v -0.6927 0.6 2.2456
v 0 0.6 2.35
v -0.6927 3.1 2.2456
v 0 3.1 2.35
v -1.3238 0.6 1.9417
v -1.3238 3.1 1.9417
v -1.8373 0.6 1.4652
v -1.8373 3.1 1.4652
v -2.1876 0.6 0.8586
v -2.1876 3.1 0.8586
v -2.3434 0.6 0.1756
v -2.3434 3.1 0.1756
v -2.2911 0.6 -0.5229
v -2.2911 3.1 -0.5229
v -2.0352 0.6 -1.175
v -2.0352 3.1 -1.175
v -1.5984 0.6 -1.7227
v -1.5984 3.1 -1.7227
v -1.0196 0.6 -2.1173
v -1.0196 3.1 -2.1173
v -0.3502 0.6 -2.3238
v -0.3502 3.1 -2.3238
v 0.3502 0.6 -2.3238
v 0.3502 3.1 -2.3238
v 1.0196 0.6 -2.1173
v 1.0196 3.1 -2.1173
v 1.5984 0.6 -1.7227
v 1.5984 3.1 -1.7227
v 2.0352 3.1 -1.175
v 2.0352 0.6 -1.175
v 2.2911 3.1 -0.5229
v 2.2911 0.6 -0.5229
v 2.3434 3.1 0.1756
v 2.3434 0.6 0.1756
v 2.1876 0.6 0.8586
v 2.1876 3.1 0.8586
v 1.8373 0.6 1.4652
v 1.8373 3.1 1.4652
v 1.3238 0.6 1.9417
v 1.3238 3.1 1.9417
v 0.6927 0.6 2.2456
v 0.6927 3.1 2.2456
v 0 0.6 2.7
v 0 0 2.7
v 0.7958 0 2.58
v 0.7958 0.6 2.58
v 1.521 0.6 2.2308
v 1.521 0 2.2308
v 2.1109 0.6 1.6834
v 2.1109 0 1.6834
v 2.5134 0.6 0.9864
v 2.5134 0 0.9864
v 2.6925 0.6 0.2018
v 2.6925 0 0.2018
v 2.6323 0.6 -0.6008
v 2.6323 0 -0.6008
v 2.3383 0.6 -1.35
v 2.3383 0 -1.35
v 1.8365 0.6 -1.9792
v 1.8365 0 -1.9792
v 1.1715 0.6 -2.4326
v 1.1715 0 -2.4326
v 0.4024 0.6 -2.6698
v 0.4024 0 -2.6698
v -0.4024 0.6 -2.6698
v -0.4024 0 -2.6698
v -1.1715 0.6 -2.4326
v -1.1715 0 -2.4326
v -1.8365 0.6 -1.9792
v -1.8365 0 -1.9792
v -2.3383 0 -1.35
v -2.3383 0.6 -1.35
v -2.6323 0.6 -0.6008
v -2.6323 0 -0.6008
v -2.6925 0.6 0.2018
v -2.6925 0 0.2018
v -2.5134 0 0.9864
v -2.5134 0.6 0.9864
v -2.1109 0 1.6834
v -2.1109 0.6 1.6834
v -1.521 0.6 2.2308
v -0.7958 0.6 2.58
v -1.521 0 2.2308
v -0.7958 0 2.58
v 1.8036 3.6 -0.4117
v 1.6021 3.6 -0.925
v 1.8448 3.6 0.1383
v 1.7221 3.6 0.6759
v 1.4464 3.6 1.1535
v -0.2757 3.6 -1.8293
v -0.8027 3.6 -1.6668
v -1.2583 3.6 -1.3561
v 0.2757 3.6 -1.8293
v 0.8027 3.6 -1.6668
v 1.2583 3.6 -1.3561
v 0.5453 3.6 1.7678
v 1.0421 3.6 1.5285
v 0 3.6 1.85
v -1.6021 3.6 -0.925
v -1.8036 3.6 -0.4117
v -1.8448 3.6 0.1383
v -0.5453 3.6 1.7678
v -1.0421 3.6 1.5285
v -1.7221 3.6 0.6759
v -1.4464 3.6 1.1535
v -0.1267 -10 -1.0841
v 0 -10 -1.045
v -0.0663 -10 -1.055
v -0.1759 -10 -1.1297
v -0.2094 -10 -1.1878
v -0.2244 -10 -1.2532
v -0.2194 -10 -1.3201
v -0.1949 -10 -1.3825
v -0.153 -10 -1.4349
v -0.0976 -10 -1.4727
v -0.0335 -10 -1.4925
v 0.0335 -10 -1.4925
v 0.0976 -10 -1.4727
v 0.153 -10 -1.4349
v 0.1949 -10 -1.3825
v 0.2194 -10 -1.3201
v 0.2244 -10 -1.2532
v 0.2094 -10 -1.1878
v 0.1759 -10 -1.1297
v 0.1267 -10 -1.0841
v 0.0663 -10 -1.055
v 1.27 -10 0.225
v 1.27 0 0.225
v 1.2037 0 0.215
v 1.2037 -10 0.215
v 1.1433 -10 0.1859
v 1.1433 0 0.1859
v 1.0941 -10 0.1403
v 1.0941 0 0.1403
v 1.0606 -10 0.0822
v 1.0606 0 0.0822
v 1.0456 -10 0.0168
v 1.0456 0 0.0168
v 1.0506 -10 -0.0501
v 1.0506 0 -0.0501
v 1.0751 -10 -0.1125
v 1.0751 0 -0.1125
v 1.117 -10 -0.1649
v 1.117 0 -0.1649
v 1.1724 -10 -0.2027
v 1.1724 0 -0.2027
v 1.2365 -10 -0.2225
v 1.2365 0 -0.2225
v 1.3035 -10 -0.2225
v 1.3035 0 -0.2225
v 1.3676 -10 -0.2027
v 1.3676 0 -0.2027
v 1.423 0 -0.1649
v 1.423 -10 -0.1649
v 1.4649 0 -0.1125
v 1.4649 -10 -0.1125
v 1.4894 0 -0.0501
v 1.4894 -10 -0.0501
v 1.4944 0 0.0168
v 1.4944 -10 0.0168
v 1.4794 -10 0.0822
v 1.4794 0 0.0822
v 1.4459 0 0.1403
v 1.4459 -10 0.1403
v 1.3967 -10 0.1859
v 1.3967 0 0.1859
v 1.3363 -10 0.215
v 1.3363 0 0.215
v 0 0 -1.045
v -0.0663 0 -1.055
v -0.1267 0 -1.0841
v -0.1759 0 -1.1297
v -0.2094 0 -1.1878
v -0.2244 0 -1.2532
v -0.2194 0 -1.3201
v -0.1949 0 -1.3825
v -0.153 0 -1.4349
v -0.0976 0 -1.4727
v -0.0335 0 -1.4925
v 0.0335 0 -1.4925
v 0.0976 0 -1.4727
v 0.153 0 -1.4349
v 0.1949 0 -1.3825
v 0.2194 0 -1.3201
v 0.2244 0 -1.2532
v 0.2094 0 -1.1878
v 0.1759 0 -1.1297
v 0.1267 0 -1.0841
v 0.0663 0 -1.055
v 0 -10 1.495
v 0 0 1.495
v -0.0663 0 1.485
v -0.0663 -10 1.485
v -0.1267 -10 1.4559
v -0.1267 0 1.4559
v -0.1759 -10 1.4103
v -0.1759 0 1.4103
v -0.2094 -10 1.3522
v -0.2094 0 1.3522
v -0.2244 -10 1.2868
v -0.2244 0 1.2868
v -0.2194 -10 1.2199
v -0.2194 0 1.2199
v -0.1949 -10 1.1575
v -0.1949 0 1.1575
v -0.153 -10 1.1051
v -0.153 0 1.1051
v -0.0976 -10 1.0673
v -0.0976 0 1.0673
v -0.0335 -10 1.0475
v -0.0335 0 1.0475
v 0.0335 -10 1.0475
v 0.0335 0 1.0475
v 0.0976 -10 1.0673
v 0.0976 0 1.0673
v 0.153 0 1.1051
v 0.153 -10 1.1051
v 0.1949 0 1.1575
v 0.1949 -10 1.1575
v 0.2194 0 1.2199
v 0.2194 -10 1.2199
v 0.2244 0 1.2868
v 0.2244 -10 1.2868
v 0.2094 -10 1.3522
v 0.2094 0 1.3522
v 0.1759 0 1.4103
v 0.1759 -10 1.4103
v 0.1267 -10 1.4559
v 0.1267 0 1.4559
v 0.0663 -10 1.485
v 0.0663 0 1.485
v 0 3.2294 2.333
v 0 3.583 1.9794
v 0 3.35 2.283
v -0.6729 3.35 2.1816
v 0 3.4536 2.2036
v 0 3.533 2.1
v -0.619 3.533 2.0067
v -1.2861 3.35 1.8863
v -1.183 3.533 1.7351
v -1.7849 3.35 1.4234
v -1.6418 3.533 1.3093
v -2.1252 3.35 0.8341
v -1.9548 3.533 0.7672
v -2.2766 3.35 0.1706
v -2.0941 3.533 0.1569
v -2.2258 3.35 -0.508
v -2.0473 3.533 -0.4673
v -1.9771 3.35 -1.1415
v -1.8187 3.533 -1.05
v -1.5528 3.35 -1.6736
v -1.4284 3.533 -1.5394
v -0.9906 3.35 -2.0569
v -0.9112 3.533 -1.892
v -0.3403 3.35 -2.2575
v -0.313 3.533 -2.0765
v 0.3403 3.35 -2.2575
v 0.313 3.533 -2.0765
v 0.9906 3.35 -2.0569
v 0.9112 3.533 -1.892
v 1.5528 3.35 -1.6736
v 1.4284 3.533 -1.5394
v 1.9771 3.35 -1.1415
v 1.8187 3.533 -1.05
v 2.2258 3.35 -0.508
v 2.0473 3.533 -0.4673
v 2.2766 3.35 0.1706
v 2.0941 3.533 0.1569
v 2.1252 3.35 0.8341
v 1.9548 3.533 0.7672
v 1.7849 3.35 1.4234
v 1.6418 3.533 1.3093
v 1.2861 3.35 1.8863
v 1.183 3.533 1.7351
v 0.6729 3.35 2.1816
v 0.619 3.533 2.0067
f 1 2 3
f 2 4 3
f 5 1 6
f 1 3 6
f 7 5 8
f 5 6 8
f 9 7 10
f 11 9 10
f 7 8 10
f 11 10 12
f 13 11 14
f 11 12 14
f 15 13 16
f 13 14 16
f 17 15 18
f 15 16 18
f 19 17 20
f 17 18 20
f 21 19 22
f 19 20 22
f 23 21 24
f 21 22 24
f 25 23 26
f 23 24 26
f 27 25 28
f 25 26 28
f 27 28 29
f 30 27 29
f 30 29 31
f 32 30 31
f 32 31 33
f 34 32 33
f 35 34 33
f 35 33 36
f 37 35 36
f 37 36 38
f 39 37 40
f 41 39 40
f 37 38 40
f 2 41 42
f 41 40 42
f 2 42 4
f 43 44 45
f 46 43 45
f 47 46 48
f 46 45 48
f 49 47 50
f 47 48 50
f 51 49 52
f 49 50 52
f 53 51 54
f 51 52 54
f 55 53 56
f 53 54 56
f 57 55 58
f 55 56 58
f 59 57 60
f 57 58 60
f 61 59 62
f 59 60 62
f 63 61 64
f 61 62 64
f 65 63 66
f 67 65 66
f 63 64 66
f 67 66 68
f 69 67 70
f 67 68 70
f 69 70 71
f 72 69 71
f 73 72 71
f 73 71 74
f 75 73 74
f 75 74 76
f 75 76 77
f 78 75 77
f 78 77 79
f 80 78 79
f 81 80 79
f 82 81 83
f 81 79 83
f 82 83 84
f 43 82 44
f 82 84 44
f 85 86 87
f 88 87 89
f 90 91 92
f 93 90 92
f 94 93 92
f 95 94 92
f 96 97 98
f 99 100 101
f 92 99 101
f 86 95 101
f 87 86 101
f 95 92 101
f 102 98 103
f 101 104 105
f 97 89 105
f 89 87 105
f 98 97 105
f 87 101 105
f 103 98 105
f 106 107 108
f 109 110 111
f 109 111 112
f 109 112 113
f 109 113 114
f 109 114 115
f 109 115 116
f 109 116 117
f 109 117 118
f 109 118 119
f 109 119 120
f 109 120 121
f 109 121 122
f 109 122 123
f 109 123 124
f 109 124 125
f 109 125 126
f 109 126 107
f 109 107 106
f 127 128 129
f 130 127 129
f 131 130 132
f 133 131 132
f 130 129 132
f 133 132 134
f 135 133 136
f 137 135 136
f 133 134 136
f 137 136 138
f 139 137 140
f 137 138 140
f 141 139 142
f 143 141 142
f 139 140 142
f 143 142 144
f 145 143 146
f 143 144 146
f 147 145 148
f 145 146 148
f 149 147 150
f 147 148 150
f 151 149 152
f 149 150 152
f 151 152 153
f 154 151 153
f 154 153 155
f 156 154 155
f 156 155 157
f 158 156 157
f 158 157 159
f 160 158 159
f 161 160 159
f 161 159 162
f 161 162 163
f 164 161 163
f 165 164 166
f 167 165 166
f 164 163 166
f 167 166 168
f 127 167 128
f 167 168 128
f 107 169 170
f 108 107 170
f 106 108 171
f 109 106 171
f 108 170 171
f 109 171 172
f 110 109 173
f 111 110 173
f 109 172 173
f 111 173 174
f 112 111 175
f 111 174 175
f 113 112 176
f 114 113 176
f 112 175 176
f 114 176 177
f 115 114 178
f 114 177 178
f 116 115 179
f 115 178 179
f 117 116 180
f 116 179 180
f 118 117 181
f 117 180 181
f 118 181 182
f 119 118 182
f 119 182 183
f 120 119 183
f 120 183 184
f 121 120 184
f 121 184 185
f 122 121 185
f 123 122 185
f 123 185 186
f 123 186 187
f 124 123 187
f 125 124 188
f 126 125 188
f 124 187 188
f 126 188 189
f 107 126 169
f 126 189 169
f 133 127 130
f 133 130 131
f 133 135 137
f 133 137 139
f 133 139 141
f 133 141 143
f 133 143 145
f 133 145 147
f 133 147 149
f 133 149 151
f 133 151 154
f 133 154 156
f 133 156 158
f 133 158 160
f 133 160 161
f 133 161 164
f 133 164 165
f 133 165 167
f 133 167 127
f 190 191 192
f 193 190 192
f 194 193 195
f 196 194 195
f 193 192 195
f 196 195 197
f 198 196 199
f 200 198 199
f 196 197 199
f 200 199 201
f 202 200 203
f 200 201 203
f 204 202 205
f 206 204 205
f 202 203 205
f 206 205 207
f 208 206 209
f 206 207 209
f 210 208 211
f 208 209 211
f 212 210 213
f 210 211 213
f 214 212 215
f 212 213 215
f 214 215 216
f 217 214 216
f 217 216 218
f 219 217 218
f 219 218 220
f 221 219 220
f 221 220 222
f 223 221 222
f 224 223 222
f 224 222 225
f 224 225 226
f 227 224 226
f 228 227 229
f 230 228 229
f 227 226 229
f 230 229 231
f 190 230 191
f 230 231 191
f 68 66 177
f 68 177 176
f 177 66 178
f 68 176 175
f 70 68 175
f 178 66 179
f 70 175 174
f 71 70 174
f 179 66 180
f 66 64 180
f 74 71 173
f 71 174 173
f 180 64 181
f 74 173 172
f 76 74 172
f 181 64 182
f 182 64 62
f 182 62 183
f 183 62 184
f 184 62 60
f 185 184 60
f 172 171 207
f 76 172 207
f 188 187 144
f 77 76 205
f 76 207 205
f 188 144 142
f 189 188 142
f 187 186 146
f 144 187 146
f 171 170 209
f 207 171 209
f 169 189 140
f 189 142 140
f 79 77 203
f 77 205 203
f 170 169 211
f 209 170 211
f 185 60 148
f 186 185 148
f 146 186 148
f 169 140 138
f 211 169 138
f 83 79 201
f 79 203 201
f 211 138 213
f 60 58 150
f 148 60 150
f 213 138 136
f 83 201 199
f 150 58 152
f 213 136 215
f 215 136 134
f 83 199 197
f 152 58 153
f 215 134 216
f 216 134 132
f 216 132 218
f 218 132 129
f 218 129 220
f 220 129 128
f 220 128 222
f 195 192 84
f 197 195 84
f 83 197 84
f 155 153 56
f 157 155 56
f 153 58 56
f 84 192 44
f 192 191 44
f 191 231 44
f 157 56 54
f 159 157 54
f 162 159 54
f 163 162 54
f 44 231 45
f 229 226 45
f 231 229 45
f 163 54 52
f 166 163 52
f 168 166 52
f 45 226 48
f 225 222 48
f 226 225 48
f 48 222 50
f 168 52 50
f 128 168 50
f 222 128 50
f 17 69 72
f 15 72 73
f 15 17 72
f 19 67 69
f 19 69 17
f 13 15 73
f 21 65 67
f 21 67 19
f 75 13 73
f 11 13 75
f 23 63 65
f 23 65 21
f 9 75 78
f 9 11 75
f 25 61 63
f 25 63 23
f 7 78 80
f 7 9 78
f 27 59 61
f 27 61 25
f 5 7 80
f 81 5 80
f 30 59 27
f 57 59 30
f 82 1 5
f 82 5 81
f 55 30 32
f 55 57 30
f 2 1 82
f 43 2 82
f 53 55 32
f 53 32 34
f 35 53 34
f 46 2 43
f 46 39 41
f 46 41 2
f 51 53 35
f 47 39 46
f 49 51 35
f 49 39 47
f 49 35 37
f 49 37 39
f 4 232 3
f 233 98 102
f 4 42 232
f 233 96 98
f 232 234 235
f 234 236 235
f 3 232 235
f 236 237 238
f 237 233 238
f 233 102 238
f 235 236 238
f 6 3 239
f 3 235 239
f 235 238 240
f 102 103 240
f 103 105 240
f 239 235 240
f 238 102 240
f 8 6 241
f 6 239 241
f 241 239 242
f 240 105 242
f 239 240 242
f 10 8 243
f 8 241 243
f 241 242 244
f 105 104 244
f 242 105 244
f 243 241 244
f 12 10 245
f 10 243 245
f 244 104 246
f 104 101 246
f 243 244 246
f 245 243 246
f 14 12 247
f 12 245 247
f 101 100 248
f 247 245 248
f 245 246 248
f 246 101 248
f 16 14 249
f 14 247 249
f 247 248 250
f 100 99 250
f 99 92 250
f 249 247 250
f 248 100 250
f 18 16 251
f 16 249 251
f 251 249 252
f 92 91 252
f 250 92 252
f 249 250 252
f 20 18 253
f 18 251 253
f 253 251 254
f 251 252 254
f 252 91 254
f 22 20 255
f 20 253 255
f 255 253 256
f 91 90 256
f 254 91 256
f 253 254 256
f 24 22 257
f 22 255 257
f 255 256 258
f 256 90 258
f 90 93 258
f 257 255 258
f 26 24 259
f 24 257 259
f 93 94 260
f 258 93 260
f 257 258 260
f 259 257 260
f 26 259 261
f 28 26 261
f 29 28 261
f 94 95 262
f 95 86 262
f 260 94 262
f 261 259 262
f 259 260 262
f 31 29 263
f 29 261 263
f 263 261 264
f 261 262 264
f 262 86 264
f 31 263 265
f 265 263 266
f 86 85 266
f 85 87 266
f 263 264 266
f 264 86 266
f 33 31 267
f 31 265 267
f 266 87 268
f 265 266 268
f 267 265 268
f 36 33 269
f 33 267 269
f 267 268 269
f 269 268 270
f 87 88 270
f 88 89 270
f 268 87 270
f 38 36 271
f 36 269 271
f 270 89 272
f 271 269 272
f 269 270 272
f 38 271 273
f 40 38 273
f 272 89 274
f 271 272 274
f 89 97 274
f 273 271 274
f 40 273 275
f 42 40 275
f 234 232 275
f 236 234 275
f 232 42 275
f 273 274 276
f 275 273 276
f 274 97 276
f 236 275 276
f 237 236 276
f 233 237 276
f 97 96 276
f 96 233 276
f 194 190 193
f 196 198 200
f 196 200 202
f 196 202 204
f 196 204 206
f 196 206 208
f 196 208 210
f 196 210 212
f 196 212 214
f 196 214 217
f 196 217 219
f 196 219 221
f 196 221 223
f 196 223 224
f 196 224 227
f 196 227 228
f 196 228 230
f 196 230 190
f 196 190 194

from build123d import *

# Parameters (mm, degrees)
SKETCH_1_R      = 2.7
EXTRUDE_1_DEPTH = 0.6
SKETCH_5_R      = 0.225
EXTRUDE_2_DEPTH = 10


with BuildPart() as part:
    # Эскиз1 → Бобышка-Вытянуть1 (new body)
    with BuildSketch(Plane(origin=(0, 0, 0), x_dir=(1, 0, 0), z_dir=(0, 1, 0))):
        with Locations(Location((0, 0, 0), (0, 0, 270))):
            Circle(SKETCH_1_R)
    extrude(amount=EXTRUDE_1_DEPTH)

    # Sketch 1 2 → Повернуть1 (revolve)
    with BuildSketch(Plane(origin=(0, 0.6, 0), x_dir=(-0.5248887029964605, 0.85117086972399, 0), z_dir=(0, 0, 1)), mode=Mode.PRIVATE) as revolve_1_sk:
        with BuildLine():
            Line((0, 0), (1.233488452, 2.000251544))
            Line((1.233488452, 2.000251544), (3.361415626, 0.688029786))
            ThreePointArc((3.361415626, 0.688029786), (3.585481802, 0.377802518), (3.52455671, 0))
            Line((3.52455671, 0), (2.553512609, -1.574666109))
            Line((2.553512609, -1.574666109), (0, 0))
        make_face()
    revolve(revolve_1_sk.sketch.rotate(Axis((0, 7.936864243, 0), (0, -1, 0)), 270), axis=Axis((0, 7.936864243, 0), (0, -1, 0)))

    # Эскиз5 → Бобышка-Вытянуть2 (add)
    with BuildSketch(Plane.XZ):
        with Locations(Location((1.27, 0, 0), (0, 0, 90))):
            Circle(SKETCH_5_R)
        with Locations(Location((0, 1.27, 0), (0, 0, 90))):
            Circle(SKETCH_5_R)
        with Locations(Location((0, -1.27, 0), (0, 0, 90))):
            Circle(SKETCH_5_R)
    extrude(amount=EXTRUDE_2_DEPTH)


solid = part.part
